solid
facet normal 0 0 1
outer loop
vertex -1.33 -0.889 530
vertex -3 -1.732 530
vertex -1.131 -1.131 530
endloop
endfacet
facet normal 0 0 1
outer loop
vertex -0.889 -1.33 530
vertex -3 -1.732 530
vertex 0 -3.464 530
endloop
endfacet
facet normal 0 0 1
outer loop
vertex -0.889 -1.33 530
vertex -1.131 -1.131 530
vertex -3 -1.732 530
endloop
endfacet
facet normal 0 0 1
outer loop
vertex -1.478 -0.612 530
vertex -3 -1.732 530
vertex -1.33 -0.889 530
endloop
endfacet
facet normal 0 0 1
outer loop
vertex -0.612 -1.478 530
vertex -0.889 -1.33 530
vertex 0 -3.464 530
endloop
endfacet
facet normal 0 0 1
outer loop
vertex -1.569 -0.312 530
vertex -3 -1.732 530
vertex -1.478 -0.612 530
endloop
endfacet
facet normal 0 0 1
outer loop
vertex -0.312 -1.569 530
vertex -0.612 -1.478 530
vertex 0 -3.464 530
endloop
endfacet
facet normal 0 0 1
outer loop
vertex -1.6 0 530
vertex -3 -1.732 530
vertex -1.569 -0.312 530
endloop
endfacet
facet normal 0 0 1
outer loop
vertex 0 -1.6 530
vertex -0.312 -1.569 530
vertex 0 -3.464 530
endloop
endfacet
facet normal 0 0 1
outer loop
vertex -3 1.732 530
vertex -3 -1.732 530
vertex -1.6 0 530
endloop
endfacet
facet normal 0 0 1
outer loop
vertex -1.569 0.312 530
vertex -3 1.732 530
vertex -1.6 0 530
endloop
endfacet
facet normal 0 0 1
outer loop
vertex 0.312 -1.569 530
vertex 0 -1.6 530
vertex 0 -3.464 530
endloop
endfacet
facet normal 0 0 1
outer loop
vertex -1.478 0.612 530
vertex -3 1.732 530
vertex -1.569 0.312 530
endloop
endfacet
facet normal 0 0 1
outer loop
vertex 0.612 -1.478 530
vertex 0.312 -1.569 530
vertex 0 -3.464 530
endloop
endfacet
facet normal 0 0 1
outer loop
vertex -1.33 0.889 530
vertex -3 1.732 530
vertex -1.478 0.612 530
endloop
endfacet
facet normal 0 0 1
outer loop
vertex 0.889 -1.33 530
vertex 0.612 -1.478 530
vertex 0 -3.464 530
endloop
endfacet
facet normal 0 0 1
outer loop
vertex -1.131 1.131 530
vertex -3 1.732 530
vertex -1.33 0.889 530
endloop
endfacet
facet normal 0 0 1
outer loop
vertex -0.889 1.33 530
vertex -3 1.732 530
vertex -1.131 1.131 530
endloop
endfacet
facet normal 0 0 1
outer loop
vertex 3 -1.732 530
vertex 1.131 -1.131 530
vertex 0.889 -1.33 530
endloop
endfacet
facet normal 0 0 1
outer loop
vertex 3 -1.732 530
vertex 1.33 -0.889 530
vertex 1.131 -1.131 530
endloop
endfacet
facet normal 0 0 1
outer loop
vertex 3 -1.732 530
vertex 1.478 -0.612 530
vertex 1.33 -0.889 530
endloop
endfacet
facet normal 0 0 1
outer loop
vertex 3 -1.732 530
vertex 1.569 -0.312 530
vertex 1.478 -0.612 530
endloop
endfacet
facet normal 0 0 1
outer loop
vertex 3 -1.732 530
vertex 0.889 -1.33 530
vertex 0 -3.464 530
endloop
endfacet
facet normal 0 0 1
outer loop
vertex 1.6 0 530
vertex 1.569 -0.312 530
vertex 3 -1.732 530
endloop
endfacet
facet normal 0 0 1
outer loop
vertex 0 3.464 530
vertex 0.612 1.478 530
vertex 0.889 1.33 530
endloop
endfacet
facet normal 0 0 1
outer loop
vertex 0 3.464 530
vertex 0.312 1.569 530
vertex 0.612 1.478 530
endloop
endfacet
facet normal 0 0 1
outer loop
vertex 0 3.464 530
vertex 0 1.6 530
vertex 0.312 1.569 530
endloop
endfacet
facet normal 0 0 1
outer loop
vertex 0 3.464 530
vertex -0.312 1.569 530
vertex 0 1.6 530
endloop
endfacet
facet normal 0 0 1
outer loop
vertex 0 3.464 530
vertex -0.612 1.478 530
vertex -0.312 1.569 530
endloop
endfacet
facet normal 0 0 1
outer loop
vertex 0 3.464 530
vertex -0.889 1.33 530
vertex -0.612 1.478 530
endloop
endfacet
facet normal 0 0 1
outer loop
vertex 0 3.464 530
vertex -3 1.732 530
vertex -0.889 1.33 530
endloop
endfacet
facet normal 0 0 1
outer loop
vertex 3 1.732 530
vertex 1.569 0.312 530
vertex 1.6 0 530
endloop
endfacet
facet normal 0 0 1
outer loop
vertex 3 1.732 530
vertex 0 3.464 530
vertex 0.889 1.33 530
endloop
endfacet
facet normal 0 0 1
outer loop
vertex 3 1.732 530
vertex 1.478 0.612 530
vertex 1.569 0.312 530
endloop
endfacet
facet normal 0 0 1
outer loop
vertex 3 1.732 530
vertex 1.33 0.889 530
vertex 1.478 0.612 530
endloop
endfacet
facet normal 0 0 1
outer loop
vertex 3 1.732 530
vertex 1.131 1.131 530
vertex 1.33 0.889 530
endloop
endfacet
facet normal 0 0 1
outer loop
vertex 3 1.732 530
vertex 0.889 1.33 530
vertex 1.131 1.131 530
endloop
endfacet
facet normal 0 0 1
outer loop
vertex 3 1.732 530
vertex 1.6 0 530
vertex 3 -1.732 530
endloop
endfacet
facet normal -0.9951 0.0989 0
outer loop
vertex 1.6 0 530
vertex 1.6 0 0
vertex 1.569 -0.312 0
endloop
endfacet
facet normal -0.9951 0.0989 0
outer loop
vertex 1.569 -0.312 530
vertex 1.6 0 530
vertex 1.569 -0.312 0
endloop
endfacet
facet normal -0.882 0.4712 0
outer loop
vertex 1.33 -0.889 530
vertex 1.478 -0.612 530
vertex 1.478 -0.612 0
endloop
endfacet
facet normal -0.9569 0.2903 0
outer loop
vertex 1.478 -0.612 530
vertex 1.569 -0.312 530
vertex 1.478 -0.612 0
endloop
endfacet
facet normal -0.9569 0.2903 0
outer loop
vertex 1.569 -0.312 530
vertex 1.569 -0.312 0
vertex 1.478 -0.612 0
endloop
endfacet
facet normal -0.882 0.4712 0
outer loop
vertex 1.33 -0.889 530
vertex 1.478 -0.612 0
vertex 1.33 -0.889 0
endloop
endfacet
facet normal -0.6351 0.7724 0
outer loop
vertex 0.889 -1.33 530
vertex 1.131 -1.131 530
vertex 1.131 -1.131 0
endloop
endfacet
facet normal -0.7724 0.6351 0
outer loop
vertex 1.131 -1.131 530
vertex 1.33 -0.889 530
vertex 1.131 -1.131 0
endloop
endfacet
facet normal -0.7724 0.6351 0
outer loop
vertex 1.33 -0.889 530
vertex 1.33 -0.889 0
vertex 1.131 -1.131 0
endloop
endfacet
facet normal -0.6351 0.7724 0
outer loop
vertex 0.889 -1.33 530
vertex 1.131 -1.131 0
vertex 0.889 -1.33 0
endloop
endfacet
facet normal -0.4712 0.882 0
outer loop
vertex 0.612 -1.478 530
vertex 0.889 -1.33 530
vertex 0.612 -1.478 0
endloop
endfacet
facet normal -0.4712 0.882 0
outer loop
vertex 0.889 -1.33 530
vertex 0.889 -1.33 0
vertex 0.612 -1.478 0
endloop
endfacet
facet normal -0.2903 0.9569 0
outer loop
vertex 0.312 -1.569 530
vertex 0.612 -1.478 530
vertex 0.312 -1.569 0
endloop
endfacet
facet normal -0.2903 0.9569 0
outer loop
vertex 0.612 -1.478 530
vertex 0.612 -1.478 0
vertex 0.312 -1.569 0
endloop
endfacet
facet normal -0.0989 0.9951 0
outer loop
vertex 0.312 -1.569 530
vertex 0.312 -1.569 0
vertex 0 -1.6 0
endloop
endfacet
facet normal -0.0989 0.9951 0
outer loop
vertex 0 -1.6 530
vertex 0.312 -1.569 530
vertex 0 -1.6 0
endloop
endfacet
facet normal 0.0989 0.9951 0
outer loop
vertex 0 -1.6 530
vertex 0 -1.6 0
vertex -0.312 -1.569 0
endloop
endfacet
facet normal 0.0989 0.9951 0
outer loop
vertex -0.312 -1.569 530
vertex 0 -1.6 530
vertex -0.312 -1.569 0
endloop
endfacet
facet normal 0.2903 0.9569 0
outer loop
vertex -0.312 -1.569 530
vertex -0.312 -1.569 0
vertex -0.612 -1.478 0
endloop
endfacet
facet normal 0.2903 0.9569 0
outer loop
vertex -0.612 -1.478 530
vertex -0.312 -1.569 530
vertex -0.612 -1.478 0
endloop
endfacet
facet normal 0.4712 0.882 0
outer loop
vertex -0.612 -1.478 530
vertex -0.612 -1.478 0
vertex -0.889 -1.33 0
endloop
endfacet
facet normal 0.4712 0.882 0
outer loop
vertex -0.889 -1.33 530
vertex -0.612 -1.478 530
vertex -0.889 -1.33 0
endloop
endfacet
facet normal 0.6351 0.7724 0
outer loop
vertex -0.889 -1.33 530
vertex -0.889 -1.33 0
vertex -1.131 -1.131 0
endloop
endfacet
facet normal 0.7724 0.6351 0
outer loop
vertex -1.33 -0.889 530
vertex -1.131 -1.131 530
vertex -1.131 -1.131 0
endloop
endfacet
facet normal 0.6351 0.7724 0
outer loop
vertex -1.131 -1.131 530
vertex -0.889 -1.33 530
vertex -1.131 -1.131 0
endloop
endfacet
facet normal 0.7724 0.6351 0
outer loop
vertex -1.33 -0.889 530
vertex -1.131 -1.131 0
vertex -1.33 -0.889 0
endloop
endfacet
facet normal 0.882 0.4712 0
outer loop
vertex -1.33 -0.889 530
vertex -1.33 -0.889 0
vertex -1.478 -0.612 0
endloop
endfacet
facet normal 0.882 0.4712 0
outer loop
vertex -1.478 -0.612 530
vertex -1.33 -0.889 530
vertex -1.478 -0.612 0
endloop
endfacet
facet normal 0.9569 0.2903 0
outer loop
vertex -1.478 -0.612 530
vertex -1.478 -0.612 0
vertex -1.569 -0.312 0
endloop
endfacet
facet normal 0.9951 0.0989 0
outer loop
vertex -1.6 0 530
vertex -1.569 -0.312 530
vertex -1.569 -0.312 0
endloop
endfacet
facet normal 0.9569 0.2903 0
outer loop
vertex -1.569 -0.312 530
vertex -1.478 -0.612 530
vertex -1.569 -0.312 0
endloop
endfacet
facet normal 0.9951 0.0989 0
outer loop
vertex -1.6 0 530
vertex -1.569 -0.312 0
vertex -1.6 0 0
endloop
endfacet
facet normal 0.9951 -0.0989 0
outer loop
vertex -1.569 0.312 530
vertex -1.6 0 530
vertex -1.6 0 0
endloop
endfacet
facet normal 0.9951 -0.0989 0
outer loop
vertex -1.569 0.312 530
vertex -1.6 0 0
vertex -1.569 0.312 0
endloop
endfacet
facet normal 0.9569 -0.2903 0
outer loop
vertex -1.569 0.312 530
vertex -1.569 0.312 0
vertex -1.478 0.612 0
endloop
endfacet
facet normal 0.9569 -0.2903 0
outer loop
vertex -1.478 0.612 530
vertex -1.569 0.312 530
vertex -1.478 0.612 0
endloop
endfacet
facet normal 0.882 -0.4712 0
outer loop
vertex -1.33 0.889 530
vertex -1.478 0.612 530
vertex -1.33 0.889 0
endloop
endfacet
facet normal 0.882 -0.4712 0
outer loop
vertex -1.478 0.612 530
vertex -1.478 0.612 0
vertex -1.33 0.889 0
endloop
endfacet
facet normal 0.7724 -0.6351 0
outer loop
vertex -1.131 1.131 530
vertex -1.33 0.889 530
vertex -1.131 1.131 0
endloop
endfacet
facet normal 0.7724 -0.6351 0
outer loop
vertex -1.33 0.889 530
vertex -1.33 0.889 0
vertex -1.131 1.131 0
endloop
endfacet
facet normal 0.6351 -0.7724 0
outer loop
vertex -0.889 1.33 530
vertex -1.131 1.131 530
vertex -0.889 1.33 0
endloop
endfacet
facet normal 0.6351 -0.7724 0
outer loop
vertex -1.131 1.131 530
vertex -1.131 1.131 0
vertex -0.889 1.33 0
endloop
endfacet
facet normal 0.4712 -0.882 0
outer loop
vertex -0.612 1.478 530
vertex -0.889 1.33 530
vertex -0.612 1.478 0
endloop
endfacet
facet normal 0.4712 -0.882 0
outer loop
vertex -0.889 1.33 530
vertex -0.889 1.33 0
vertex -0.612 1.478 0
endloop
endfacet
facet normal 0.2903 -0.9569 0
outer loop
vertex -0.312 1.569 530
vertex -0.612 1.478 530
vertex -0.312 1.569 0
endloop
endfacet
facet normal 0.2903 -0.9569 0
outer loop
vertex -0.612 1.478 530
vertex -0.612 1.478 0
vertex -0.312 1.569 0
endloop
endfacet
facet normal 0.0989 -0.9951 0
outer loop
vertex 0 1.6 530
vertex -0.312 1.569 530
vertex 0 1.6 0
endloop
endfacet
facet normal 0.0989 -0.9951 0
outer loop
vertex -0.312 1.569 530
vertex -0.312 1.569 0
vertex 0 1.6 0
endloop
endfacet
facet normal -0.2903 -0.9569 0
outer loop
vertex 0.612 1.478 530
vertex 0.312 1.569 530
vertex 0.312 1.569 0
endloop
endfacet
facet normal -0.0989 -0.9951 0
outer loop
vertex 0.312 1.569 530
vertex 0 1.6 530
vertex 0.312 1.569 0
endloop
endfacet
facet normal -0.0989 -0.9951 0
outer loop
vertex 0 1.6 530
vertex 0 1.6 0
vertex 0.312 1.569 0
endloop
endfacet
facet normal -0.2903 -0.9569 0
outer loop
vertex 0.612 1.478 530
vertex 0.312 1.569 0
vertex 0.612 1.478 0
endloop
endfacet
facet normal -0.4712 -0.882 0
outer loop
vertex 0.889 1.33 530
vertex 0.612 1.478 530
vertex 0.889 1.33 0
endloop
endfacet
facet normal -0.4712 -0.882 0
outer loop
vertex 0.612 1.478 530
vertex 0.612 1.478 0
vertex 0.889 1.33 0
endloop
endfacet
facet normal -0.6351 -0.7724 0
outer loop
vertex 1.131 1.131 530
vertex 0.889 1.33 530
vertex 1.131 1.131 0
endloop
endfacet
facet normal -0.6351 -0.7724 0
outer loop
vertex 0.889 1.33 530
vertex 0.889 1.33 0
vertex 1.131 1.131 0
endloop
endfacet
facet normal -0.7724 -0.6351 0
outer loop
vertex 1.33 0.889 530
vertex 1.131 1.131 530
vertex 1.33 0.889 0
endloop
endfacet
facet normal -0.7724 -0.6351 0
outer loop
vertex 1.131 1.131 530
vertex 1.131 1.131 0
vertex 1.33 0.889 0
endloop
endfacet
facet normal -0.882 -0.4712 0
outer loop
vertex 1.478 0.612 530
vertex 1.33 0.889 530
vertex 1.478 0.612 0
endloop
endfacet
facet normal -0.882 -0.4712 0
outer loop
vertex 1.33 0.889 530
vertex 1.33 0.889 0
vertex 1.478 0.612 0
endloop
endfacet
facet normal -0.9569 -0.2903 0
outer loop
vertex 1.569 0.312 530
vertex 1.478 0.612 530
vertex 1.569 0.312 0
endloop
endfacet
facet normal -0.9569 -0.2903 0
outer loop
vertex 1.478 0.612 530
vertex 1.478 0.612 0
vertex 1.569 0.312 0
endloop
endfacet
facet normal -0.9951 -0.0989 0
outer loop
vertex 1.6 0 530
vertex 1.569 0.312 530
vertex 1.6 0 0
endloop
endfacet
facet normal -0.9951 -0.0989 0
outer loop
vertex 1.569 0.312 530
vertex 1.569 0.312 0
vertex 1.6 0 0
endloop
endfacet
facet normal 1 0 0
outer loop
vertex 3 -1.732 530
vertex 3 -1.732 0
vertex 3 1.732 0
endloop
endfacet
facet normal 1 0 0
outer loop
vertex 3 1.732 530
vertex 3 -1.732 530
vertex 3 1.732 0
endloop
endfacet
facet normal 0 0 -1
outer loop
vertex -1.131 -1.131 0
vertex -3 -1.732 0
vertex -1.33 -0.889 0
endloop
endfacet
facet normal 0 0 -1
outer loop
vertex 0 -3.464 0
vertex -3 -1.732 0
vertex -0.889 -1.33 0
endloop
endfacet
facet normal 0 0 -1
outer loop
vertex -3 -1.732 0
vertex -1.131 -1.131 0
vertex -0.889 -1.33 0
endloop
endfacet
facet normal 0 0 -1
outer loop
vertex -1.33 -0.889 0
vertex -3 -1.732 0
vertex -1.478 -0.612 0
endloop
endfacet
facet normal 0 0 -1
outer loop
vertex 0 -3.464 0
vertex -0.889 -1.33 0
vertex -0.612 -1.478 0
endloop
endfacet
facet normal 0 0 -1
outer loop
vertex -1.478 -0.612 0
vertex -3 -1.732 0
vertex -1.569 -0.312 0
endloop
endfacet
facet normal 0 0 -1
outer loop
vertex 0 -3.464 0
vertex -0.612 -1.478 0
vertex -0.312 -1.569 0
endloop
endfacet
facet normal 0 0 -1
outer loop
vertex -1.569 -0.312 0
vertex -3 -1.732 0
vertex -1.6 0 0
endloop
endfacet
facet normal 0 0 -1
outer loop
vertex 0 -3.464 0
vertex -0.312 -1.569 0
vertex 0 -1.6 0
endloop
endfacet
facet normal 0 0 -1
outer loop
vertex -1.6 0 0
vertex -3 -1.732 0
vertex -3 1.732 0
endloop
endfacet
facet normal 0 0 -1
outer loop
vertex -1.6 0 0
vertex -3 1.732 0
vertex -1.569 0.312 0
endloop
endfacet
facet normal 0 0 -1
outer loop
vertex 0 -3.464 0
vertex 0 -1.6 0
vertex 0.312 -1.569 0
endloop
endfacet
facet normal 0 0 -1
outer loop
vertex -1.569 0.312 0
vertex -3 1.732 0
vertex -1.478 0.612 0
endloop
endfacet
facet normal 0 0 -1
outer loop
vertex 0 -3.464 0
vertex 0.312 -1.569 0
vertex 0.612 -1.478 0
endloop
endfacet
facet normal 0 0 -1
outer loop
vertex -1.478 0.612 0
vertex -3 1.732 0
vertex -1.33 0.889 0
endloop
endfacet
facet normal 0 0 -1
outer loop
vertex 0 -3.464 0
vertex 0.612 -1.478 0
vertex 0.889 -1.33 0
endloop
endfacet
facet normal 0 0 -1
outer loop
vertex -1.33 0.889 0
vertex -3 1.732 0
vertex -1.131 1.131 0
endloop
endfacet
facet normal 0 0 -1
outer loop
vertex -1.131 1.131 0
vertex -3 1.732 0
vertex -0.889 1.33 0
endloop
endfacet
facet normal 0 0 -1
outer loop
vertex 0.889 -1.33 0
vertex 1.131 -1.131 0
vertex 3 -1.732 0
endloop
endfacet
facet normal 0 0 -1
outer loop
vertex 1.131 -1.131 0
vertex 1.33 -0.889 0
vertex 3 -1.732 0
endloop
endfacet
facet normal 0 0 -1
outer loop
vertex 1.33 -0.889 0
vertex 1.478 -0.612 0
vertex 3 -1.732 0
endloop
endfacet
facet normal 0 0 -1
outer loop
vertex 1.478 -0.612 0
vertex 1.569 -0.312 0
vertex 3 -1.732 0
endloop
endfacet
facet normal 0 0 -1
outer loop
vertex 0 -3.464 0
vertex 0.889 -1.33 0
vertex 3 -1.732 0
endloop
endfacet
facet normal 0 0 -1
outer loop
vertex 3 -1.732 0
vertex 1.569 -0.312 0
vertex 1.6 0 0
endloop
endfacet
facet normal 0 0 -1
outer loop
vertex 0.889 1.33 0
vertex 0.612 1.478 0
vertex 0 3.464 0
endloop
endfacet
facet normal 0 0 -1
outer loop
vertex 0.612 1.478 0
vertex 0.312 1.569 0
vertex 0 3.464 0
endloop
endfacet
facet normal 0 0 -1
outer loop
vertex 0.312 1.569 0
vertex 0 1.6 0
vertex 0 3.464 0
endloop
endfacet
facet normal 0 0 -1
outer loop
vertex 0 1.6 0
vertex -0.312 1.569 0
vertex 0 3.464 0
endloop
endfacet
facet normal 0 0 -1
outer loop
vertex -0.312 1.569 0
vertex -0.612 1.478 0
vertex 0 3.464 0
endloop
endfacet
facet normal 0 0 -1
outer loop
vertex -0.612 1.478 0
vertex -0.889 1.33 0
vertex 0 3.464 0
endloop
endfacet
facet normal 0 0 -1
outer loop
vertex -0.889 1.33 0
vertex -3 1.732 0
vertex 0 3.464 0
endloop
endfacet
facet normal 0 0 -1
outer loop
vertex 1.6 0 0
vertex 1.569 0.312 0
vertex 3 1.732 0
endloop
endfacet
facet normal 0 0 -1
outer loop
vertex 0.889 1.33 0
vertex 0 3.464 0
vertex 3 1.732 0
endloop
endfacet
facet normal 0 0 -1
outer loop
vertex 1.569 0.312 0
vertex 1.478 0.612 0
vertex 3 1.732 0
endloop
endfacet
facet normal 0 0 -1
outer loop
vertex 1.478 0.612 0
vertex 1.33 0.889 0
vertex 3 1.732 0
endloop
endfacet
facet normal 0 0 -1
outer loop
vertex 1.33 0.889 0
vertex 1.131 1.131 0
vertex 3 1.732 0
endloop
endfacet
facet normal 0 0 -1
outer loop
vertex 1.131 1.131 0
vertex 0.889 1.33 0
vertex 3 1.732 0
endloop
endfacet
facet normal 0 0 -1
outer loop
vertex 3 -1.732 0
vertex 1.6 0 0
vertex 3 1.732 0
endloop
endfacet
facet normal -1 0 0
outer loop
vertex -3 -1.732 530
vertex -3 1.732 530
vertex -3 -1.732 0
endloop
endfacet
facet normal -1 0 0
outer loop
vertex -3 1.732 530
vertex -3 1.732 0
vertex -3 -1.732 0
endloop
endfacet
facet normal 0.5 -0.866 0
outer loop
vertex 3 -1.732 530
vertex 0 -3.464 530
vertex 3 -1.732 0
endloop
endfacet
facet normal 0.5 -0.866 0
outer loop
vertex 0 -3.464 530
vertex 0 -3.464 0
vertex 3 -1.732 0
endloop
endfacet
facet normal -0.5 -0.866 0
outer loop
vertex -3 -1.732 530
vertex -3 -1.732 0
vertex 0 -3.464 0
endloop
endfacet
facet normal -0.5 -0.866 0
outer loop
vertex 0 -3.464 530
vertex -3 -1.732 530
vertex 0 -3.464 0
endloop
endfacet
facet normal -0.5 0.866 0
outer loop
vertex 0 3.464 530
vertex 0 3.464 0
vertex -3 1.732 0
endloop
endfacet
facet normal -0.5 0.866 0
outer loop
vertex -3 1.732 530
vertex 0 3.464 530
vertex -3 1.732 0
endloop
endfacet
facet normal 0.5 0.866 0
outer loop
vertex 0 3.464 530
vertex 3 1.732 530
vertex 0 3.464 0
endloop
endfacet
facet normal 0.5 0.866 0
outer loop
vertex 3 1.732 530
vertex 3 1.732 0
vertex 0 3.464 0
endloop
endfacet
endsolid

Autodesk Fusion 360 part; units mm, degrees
sketch "Sketch1" plane through (0, 0, 0) normal (0, 0, 1) x (1, 0, 0)
  circle A0 centre (0, 0) radius 7.5
  circle A1 centre (0, 0) radius 6.5
  dimension "d1" = 15
  dimension "d2" = -1
extrude "Extrude1" add sketch "Sketch1" along normal blind 497
equation "d3 = 527 mm - 30 mm"

Autodesk Fusion 360 part; units mm, degrees
sketch "Sketch1" plane through (0, 0, 0) normal (0, 0, 1) x (1, 0, 0)
  circle A0 centre (0, 0) radius 7.5
  circle A1 centre (0, 0) radius 6.5
  dimension "d1" = 15
  dimension "d2" = -1
extrude "Extrude1" add sketch "Sketch1" along normal blind 530
equation "d3 = 560 mm - 30 mm"

Autodesk Fusion 360 part; units mm, degrees
sketch "Sketch1" plane through (0, 0, 0) normal (0, 0, 1) x (1, 0, 0)
  line L0 (-29, 14) -> (29, 14)
  line L1 (29, 14) -> (29, -14)
  line L2 (29, -14) -> (-29, -14)
  line L3 (-29, -14) -> (-29, 14)
  line L4 (-29, 14) -> (29, -14) construction
  line L5 (29, 14) -> (-29, -14) construction
  dimension "d1" = 28
  dimension "d2" = 58
extrude "Extrude1" add sketch "Sketch1" along normal blind 175

Autodesk Fusion 360 part; units mm, degrees
sketch "Sketch1" plane through (0, 0, 0) normal (0, 0, 1) x (1, 0, 0)
  circle A0 centre (0, 0) radius 1.6
  line L0 (-3, -1.7321) -> (0, -3.4641)
  line L1 (0, -3.4641) -> (3, -1.7321)
  line L2 (3, -1.7321) -> (3, 1.7321)
  line L3 (3, 1.7321) -> (0, 3.4641)
  line L4 (0, 3.4641) -> (-3, 1.7321)
  line L5 (-3, 1.7321) -> (-3, -1.7321)
  dimension "d1" = 3.2
extrude "Extrude1" add sketch "Sketch1" along normal blind 25.3
